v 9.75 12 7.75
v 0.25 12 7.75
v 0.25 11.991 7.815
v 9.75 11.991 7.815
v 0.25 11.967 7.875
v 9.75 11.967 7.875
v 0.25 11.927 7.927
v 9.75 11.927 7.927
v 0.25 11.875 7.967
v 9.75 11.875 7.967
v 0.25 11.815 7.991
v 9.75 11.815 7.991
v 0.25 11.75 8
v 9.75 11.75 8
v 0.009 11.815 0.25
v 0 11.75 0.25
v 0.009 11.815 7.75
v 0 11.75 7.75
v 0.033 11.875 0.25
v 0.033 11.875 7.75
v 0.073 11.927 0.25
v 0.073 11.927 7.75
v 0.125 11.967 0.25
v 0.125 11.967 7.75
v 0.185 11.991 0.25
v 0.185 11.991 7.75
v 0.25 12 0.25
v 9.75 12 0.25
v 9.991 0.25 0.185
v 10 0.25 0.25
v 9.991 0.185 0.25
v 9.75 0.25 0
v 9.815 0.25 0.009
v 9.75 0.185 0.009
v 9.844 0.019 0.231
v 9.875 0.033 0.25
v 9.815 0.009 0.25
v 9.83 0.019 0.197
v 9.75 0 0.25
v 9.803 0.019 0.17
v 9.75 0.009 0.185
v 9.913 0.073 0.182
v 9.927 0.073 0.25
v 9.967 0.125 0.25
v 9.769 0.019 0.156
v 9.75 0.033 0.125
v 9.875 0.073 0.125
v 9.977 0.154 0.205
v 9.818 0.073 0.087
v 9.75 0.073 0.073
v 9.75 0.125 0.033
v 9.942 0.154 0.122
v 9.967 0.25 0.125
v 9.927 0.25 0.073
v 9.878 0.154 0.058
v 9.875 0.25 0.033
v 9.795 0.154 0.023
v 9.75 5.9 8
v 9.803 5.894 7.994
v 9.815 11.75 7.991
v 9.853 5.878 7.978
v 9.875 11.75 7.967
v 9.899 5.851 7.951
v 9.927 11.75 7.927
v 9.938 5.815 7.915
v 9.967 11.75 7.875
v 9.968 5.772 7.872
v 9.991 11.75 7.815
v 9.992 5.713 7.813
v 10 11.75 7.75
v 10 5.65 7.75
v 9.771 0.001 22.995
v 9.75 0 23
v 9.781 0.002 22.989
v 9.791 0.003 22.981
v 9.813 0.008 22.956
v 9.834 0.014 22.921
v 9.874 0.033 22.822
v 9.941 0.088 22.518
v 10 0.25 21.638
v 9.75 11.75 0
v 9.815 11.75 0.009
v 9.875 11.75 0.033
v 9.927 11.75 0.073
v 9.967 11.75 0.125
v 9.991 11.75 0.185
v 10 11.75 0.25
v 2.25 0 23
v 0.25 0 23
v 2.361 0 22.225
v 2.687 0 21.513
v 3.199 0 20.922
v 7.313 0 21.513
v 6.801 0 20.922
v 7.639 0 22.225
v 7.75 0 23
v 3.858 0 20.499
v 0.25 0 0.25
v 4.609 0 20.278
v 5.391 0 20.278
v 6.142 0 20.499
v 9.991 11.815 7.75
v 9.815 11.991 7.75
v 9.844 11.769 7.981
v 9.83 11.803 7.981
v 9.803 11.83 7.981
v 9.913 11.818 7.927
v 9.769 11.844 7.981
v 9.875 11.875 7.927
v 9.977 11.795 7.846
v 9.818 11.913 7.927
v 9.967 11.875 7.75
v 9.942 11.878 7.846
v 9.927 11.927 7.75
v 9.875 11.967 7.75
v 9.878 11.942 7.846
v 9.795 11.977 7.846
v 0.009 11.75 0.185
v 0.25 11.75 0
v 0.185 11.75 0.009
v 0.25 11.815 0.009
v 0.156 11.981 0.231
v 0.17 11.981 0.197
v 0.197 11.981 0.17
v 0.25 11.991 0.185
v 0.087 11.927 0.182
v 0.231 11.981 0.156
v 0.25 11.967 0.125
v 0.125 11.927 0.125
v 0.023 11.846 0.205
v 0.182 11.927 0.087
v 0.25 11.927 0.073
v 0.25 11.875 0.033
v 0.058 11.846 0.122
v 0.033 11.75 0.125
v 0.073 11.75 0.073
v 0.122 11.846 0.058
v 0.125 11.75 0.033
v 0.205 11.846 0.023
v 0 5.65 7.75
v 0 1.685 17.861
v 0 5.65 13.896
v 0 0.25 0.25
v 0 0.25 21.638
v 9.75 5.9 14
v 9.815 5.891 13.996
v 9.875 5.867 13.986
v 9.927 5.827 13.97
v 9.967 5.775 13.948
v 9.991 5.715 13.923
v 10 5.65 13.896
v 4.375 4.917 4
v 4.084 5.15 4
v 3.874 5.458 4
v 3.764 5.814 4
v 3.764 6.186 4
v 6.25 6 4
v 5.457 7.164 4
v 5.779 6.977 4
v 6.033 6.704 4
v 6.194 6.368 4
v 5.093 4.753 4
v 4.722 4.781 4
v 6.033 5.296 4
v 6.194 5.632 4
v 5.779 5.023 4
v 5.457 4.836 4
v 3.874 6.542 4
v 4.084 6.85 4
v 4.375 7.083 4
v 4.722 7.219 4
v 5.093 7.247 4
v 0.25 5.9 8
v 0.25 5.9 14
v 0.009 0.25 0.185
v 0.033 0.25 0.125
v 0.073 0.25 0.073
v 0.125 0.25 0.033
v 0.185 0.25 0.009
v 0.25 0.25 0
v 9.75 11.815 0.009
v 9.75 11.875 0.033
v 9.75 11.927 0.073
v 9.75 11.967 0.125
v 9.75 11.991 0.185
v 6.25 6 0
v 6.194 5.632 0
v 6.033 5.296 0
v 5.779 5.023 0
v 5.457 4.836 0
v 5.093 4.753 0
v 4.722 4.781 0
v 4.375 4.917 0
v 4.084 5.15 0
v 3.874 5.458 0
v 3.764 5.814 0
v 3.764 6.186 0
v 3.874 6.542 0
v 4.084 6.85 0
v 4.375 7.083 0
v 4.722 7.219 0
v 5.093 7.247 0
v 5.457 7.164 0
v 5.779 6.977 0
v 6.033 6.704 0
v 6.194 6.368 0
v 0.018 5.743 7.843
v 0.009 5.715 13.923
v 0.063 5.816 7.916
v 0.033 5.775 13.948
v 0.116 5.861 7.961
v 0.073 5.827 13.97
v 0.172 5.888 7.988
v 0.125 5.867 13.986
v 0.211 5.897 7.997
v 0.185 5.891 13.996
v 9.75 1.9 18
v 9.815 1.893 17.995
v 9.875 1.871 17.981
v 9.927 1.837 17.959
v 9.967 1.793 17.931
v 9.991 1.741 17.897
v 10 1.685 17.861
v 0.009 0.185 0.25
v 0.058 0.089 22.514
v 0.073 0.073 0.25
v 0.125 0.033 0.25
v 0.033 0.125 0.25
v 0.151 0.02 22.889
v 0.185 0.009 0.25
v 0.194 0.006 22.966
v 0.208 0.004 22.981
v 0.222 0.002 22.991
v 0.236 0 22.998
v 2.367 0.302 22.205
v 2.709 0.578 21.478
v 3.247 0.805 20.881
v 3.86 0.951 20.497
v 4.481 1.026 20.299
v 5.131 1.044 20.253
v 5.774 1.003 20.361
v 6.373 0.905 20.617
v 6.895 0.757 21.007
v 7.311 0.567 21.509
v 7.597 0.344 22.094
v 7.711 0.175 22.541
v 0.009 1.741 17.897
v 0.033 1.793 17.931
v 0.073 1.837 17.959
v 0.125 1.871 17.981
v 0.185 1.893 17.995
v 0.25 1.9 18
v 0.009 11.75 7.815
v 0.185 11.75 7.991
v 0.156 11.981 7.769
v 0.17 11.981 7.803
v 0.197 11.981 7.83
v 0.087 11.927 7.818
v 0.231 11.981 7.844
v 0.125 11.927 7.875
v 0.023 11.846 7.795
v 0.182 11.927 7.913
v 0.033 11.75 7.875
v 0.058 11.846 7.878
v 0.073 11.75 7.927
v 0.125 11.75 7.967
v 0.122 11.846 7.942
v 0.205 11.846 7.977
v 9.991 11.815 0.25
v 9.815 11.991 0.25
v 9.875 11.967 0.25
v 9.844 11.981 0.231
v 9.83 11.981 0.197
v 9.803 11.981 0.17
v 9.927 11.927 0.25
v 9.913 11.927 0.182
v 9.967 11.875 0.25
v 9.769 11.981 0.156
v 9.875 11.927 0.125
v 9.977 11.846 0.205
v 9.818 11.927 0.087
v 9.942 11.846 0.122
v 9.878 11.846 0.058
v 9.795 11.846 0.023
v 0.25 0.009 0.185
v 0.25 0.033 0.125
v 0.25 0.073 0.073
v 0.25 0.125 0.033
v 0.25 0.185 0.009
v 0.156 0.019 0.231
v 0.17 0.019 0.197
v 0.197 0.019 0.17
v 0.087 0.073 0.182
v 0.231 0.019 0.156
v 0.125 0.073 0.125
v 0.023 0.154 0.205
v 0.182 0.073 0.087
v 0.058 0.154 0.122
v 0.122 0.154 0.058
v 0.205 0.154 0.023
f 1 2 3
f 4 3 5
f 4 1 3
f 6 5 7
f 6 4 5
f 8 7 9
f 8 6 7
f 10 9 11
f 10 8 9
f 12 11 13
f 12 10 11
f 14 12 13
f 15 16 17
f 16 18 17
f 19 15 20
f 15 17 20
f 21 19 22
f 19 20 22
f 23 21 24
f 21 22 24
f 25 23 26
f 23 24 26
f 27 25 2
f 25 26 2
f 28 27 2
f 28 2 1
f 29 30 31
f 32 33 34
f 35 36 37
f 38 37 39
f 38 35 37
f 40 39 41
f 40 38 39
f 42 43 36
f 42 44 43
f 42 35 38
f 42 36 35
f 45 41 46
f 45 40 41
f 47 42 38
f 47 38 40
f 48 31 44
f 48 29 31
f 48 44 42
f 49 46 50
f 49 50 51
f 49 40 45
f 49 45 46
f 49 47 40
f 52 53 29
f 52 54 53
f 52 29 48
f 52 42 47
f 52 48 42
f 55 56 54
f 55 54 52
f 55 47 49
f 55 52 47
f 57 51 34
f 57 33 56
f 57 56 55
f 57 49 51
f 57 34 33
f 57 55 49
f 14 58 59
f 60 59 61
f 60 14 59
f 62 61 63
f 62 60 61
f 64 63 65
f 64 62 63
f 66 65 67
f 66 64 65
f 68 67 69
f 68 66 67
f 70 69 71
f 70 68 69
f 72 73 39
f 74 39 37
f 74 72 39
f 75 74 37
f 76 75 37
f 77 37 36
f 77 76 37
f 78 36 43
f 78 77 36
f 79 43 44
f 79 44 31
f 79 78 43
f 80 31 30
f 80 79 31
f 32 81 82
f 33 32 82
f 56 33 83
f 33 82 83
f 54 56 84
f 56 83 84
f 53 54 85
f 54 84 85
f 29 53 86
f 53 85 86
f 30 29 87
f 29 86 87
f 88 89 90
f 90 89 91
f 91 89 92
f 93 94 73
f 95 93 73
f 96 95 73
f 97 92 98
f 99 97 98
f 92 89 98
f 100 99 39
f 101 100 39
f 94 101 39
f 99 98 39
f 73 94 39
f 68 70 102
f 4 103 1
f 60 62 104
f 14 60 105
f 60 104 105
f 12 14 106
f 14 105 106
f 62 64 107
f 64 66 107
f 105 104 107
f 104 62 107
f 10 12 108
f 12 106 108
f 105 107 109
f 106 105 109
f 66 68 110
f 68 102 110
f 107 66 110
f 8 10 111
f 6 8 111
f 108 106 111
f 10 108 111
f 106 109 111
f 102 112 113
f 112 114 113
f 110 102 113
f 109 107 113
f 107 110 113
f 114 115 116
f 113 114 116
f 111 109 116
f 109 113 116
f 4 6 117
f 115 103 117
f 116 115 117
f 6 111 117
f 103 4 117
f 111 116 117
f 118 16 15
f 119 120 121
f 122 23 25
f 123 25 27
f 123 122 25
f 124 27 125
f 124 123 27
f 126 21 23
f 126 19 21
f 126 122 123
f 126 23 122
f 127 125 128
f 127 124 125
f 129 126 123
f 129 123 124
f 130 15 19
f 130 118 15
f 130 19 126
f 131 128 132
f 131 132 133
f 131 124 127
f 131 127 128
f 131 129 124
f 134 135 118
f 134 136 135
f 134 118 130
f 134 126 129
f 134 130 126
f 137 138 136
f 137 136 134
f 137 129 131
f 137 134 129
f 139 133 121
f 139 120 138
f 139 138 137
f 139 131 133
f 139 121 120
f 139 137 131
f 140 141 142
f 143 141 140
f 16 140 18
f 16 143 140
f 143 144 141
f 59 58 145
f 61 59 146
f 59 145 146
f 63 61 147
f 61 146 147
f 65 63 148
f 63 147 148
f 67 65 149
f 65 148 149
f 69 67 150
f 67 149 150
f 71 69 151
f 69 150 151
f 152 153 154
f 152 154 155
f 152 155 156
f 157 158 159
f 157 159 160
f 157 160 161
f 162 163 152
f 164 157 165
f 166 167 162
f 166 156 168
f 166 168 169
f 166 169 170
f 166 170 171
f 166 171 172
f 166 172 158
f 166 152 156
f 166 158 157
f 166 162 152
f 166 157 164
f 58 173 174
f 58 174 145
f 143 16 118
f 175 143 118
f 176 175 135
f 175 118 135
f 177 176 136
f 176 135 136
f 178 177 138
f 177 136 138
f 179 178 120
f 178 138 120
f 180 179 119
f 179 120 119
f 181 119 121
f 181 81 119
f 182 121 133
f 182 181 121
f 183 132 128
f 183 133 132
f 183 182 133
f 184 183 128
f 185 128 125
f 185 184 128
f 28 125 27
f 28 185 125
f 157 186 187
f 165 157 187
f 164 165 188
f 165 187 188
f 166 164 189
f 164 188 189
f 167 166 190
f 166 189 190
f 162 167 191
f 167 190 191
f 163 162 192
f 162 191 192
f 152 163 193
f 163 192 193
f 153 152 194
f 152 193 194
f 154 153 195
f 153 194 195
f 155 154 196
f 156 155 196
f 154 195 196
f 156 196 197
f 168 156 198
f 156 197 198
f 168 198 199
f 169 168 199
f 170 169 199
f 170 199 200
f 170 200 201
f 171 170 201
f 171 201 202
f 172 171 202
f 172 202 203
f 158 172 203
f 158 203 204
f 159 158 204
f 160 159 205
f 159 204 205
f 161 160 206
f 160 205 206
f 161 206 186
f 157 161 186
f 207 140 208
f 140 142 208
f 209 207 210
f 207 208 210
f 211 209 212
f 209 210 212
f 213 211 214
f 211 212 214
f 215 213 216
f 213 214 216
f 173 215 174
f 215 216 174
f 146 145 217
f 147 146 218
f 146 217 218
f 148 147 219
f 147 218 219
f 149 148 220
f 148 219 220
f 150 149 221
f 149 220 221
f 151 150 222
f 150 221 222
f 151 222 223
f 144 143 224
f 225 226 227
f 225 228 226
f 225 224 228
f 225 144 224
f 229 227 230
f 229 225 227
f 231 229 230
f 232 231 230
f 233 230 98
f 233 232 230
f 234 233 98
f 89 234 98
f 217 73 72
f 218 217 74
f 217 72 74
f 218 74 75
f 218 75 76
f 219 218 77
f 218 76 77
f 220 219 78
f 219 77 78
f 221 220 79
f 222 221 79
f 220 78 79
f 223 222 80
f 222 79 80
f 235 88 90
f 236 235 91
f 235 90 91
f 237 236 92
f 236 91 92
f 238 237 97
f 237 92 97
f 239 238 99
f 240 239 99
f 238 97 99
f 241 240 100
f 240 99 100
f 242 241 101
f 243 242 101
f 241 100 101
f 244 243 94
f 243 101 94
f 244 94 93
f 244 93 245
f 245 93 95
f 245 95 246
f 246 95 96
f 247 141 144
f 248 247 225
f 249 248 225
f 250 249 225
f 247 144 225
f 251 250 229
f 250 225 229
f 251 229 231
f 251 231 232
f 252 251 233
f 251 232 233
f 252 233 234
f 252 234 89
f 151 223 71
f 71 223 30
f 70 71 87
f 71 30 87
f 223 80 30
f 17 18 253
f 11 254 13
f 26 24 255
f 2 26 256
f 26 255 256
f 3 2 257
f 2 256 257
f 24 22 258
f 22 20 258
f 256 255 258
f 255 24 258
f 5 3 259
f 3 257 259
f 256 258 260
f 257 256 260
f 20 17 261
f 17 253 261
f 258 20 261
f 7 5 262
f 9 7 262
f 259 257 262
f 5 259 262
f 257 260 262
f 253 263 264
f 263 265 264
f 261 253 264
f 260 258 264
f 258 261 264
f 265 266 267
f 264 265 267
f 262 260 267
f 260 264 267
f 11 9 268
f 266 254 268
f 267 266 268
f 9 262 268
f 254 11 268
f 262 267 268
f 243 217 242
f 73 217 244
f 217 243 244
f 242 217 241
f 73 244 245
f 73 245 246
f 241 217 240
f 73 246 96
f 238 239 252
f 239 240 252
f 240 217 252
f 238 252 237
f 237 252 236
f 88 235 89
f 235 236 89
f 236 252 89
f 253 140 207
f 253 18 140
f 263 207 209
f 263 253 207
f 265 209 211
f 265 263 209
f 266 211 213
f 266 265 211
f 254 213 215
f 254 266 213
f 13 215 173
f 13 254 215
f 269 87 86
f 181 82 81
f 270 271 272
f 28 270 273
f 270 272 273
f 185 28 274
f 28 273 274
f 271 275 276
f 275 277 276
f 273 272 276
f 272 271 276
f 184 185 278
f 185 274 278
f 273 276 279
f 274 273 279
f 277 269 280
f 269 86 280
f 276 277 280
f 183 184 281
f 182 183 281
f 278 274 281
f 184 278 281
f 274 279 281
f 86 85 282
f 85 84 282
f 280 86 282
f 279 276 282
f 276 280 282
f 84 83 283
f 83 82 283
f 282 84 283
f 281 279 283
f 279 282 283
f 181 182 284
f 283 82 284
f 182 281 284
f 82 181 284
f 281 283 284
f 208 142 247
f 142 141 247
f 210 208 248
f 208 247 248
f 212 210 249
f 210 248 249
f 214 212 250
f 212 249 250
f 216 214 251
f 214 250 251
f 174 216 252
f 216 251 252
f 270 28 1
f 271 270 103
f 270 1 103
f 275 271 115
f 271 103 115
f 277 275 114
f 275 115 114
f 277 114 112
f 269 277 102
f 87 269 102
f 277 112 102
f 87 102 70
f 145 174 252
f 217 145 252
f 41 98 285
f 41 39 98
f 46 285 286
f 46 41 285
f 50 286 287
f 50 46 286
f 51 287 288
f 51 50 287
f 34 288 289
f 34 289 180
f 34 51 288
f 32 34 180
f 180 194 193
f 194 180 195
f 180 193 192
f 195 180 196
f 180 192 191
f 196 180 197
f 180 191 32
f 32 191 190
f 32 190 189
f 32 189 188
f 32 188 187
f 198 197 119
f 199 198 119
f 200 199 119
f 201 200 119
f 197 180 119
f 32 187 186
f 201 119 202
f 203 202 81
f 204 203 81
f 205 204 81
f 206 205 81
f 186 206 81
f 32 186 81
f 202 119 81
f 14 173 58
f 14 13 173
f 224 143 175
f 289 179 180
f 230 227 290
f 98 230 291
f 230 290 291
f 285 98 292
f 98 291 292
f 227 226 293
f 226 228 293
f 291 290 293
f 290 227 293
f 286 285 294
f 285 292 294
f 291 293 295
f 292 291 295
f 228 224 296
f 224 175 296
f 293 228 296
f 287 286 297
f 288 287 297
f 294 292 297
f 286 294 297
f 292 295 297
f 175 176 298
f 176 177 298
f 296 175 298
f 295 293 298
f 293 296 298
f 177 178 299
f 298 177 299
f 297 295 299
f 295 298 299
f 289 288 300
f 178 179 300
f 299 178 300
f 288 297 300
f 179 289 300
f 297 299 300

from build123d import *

# Parameters (mm, degrees)
F0_W      = 10
F0_H      = 12
F1_DEPTH  = 8
F2_W      = 10
F2_H      = 5.9
F3_DEPTH  = 15
F4_W      = 4
F4_H      = 5
F5_DEPTH  = 10
F7_DEPTH  = 25
F8_R      = 0.25
F9_R      = 1.25
F10_DEPTH = 4


with BuildPart() as f1:
    # F0 (on Top) → F1 (new body)
    with BuildSketch(Plane.XY):
        with Locations((5, 6)):
            Rectangle(F0_W, F0_H)
    extrude(amount=F1_DEPTH)

    # F2 (on face) → F3 (join)
    with BuildSketch(Plane.XY.offset(8)):
        with Locations((5, 2.95)):
            Rectangle(F2_W, F2_H)
    extrude(amount=F3_DEPTH)

    # F4 (on face) → F5 (cut, through all)
    with BuildSketch(Plane(origin=(0, 0, 0), x_dir=(0, -1, 0), z_dir=(-1, 0, 0))):
        Polygon((-1.9, 18), (-5.9, 18), (-5.9, 14), align=None)
        with Locations((-3.9, 20.5)):
            Rectangle(F4_W, F4_H)
        Polygon((-1.9, 23), (-1.9, 18), (0, 23), align=None)
    extrude(amount=-F5_DEPTH, mode=Mode.SUBTRACT)

    # F6 (on face) → F7 (cut)
    with BuildSketch(Plane.XZ):
        with BuildLine():
            ThreePointArc((2.25, 23), (5, 20.25), (7.75, 23))
            Line((7.75, 23), (2.25, 23))
        make_face()
    extrude(amount=-F7_DEPTH, mode=Mode.SUBTRACT)

    # F8
    f8_edges = [f1.edges().sort_by_distance(p)[0] for p in [
        (10, 6, 0),
        (10, 12, 4),
        (10, 8.95, 8),
        (10, 5.9, 11),
        (10, 3.9, 16),
        (10, 0.95, 20.5),
        (10, 0, 11.5),
        (0, 6, 0),
        (0, 0, 11.5),
        (0, 0.95, 20.5),
        (0, 3.9, 16),
        (0, 5.9, 11),
        (0, 8.95, 8),
        (0, 12, 4),
        (5, 12, 0),
        (5, 12, 8),
        (5, 0, 0),
    ]]
    fillet(f8_edges, radius=F8_R)

    # F9 (on face) → F10 (cut)
    with BuildSketch(Plane(origin=(0, 0, 0), x_dir=(1, 0, 0), z_dir=(0, 0, -1))):
        with Locations((5, -6)):
            Circle(F9_R)
    extrude(amount=-F10_DEPTH, mode=Mode.SUBTRACT)


solid = f1.part
